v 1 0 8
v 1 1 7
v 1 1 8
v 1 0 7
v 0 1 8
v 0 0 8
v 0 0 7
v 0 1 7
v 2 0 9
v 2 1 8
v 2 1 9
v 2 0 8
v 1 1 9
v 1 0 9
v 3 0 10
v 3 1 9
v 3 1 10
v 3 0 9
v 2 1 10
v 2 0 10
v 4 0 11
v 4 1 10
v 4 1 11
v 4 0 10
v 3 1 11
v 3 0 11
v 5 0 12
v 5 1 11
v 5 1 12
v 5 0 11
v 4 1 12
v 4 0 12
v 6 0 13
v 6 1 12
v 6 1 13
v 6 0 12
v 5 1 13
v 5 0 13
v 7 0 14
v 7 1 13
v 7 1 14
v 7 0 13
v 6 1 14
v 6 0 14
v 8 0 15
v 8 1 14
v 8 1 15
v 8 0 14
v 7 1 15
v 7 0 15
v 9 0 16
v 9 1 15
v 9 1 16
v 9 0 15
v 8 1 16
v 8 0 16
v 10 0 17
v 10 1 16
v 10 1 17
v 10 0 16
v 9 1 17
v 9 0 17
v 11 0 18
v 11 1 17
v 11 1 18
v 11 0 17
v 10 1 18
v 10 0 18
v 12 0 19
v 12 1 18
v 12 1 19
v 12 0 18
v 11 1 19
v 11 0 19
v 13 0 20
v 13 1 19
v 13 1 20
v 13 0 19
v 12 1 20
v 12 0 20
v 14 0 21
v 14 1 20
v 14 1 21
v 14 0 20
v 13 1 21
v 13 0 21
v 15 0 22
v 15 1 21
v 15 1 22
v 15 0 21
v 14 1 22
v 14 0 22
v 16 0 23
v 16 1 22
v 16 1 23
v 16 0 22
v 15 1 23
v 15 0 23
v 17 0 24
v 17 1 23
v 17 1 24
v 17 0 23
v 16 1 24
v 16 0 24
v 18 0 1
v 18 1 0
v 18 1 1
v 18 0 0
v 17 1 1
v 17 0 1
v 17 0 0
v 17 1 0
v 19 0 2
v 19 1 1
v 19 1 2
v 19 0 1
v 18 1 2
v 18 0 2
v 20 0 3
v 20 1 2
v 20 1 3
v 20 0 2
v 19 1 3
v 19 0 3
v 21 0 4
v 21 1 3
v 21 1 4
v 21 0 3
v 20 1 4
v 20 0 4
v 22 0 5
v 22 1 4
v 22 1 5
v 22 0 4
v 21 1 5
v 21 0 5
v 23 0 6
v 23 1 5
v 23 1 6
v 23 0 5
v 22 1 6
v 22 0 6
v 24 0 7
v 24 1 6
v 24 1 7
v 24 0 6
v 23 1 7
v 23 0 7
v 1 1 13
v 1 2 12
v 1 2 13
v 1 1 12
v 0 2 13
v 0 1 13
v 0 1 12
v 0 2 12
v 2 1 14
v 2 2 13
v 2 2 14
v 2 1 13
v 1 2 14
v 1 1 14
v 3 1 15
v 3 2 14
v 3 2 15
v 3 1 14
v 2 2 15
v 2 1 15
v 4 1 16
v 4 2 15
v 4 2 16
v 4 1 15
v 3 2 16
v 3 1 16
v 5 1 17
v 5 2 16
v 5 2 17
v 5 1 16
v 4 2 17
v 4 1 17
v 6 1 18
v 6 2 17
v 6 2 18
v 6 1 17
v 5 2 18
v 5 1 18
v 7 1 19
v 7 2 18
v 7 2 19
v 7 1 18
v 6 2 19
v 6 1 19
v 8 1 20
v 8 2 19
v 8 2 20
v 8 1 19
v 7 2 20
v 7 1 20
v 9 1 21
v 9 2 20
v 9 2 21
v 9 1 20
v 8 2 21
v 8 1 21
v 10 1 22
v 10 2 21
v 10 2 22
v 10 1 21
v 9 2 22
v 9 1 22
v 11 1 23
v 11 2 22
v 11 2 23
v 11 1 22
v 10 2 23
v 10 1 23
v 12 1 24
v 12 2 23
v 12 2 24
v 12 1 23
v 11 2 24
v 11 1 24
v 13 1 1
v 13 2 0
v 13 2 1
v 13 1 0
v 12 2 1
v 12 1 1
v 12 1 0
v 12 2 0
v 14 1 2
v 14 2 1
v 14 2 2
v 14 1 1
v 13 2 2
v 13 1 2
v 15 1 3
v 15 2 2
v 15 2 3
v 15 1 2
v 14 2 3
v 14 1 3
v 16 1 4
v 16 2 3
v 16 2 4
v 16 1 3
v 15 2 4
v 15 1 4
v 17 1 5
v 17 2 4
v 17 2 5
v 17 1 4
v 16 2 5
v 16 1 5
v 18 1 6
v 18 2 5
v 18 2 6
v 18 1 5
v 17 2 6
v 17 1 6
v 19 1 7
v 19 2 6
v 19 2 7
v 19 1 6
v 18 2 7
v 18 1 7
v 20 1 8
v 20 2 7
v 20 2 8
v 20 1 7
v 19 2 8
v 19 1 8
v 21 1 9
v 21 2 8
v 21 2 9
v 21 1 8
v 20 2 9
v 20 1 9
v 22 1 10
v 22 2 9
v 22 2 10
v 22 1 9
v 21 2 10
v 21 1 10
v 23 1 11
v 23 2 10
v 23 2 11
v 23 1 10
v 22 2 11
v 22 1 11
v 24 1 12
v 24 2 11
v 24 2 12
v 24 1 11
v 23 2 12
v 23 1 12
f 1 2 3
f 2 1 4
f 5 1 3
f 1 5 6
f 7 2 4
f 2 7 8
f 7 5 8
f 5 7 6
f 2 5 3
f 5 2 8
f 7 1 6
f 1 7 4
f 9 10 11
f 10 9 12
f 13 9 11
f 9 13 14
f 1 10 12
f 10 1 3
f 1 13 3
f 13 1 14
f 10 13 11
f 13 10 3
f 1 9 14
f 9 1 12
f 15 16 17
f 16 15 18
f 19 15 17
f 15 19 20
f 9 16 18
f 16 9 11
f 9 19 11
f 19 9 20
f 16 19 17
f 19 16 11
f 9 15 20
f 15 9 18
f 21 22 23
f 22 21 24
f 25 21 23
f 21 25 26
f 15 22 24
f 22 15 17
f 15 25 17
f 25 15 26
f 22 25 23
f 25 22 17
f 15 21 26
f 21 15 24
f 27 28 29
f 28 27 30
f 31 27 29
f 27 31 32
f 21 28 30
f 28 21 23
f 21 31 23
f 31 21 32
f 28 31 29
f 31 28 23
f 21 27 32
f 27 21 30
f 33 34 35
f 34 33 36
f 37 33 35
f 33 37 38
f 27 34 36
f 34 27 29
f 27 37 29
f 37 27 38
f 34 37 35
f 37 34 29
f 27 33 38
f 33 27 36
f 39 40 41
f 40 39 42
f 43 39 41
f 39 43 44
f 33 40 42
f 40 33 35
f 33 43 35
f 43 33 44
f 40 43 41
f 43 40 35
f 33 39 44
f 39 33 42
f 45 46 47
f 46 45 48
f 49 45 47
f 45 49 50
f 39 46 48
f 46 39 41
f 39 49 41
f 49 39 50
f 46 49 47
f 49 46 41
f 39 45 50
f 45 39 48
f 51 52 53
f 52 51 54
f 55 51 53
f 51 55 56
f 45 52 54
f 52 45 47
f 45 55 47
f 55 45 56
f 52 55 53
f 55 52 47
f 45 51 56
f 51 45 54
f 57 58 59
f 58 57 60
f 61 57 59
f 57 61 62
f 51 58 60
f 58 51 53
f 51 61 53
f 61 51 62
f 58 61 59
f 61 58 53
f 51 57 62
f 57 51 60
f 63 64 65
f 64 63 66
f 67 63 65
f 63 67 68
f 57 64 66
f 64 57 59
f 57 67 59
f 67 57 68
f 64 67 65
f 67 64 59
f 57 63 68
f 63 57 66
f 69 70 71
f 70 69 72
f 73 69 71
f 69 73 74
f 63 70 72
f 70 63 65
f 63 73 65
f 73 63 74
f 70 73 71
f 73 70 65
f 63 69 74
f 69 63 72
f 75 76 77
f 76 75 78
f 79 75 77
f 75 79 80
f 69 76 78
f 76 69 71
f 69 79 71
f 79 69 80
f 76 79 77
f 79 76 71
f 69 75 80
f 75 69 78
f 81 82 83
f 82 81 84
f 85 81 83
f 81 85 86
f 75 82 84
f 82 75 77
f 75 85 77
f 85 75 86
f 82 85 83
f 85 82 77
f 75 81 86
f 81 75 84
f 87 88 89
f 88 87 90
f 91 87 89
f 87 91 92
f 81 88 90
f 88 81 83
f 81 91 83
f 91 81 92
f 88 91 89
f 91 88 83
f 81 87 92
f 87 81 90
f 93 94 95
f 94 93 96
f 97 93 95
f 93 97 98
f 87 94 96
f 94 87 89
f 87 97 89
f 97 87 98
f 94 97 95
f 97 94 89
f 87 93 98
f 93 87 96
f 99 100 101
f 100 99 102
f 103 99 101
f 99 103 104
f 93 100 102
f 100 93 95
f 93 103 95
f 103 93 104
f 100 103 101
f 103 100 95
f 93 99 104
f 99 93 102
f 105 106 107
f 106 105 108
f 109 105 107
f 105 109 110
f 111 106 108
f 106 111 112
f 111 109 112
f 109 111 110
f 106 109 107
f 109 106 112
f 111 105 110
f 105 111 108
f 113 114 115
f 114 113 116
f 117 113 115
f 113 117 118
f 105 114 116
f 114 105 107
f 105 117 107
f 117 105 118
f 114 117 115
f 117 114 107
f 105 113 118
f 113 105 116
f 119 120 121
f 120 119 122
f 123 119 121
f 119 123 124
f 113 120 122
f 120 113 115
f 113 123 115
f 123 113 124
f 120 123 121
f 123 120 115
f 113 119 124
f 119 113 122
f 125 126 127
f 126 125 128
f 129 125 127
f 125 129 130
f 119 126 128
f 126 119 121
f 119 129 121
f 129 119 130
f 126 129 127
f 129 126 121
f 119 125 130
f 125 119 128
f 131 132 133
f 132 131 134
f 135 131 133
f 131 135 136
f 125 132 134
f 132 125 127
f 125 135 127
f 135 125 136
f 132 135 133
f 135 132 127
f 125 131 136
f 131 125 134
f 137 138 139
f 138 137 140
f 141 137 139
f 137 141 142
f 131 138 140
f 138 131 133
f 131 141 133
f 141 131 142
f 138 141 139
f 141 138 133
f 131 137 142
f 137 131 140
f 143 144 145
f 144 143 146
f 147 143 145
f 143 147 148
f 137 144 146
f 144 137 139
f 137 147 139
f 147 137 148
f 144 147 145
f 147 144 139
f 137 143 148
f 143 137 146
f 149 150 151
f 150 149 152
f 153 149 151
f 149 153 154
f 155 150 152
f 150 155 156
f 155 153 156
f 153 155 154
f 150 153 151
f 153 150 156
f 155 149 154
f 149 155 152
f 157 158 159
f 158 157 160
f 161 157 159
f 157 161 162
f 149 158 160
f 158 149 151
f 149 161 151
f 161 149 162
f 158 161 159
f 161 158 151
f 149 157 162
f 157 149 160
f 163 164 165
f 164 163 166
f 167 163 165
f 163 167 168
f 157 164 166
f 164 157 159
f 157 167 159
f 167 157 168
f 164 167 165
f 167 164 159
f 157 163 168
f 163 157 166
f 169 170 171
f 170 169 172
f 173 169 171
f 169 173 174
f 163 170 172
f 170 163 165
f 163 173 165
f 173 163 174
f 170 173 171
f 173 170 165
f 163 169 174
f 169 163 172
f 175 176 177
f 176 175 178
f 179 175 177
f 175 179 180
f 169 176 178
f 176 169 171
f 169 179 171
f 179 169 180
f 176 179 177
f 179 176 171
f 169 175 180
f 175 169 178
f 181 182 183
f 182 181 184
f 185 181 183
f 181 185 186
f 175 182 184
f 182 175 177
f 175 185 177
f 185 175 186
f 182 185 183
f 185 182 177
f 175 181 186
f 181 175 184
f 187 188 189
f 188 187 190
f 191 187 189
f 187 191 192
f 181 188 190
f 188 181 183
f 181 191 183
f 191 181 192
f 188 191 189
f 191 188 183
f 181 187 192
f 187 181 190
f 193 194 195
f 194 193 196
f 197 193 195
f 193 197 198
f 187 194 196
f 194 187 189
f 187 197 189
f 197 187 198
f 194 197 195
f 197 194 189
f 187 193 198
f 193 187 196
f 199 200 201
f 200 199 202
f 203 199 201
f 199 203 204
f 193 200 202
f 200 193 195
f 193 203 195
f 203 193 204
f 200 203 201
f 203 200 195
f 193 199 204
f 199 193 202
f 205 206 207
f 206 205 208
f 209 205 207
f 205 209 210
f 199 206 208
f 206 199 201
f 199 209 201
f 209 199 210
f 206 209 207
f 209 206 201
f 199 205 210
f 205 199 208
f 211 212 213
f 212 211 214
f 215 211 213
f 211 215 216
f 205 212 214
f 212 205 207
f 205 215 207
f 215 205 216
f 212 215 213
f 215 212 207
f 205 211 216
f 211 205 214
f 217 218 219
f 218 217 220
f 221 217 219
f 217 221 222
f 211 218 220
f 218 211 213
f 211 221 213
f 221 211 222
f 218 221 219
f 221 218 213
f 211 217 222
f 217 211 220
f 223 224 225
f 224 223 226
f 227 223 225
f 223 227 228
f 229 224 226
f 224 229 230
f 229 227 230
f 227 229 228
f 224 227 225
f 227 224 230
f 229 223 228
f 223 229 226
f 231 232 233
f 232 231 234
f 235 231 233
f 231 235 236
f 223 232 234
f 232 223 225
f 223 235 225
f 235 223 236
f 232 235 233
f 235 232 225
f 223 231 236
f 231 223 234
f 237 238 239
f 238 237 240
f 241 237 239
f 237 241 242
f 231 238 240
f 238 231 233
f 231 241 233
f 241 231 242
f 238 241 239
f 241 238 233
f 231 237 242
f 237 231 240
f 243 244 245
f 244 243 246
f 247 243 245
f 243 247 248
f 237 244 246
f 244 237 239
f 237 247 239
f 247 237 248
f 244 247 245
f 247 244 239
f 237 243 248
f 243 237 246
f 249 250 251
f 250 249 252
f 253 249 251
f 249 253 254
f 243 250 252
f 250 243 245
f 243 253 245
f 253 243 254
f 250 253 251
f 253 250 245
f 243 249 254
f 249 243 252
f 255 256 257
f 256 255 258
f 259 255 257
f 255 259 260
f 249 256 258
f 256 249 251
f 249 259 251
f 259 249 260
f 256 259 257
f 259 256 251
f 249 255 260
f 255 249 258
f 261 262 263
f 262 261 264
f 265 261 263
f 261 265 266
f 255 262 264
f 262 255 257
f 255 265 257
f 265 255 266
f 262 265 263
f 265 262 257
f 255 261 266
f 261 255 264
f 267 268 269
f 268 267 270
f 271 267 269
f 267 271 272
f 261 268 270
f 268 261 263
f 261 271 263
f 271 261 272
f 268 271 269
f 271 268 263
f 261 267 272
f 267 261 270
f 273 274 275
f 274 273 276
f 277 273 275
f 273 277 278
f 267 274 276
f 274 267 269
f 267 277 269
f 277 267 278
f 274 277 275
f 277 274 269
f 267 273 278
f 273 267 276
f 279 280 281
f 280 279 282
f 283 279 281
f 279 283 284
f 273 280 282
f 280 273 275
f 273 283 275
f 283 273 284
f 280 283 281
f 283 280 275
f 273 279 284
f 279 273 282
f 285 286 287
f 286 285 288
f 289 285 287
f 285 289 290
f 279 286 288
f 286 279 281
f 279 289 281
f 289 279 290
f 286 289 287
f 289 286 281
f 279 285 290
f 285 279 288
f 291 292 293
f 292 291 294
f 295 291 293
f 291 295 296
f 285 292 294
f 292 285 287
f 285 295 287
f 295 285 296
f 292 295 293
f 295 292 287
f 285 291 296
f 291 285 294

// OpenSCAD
union() {
    translate([0, 0, 7]) cube([1, 1, 1]);
    translate([1, 0, 8]) cube([1, 1, 1]);
    translate([2, 0, 9]) cube([1, 1, 1]);
    translate([3, 0, 10]) cube([1, 1, 1]);
    translate([4, 0, 11]) cube([1, 1, 1]);
    translate([5, 0, 12]) cube([1, 1, 1]);
    translate([6, 0, 13]) cube([1, 1, 1]);
    translate([7, 0, 14]) cube([1, 1, 1]);
    translate([8, 0, 15]) cube([1, 1, 1]);
    translate([9, 0, 16]) cube([1, 1, 1]);
    translate([10, 0, 17]) cube([1, 1, 1]);
    translate([11, 0, 18]) cube([1, 1, 1]);
    translate([12, 0, 19]) cube([1, 1, 1]);
    translate([13, 0, 20]) cube([1, 1, 1]);
    translate([14, 0, 21]) cube([1, 1, 1]);
    translate([15, 0, 22]) cube([1, 1, 1]);
    translate([16, 0, 23]) cube([1, 1, 1]);
    translate([17, 0, 0]) cube([1, 1, 1]);
    translate([18, 0, 1]) cube([1, 1, 1]);
    translate([19, 0, 2]) cube([1, 1, 1]);
    translate([20, 0, 3]) cube([1, 1, 1]);
    translate([21, 0, 4]) cube([1, 1, 1]);
    translate([22, 0, 5]) cube([1, 1, 1]);
    translate([23, 0, 6]) cube([1, 1, 1]);
    translate([0, 1, 12]) cube([1, 1, 1]);
    translate([1, 1, 13]) cube([1, 1, 1]);
    translate([2, 1, 14]) cube([1, 1, 1]);
    translate([3, 1, 15]) cube([1, 1, 1]);
    translate([4, 1, 16]) cube([1, 1, 1]);
    translate([5, 1, 17]) cube([1, 1, 1]);
    translate([6, 1, 18]) cube([1, 1, 1]);
    translate([7, 1, 19]) cube([1, 1, 1]);
    translate([8, 1, 20]) cube([1, 1, 1]);
    translate([9, 1, 21]) cube([1, 1, 1]);
    translate([10, 1, 22]) cube([1, 1, 1]);
    translate([11, 1, 23]) cube([1, 1, 1]);
    translate([12, 1, 0]) cube([1, 1, 1]);
    translate([13, 1, 1]) cube([1, 1, 1]);
    translate([14, 1, 2]) cube([1, 1, 1]);
    translate([15, 1, 3]) cube([1, 1, 1]);
    translate([16, 1, 4]) cube([1, 1, 1]);
    translate([17, 1, 5]) cube([1, 1, 1]);
    translate([18, 1, 6]) cube([1, 1, 1]);
    translate([19, 1, 7]) cube([1, 1, 1]);
    translate([20, 1, 8]) cube([1, 1, 1]);
    translate([21, 1, 9]) cube([1, 1, 1]);
    translate([22, 1, 10]) cube([1, 1, 1]);
    translate([23, 1, 11]) cube([1, 1, 1]);
}
